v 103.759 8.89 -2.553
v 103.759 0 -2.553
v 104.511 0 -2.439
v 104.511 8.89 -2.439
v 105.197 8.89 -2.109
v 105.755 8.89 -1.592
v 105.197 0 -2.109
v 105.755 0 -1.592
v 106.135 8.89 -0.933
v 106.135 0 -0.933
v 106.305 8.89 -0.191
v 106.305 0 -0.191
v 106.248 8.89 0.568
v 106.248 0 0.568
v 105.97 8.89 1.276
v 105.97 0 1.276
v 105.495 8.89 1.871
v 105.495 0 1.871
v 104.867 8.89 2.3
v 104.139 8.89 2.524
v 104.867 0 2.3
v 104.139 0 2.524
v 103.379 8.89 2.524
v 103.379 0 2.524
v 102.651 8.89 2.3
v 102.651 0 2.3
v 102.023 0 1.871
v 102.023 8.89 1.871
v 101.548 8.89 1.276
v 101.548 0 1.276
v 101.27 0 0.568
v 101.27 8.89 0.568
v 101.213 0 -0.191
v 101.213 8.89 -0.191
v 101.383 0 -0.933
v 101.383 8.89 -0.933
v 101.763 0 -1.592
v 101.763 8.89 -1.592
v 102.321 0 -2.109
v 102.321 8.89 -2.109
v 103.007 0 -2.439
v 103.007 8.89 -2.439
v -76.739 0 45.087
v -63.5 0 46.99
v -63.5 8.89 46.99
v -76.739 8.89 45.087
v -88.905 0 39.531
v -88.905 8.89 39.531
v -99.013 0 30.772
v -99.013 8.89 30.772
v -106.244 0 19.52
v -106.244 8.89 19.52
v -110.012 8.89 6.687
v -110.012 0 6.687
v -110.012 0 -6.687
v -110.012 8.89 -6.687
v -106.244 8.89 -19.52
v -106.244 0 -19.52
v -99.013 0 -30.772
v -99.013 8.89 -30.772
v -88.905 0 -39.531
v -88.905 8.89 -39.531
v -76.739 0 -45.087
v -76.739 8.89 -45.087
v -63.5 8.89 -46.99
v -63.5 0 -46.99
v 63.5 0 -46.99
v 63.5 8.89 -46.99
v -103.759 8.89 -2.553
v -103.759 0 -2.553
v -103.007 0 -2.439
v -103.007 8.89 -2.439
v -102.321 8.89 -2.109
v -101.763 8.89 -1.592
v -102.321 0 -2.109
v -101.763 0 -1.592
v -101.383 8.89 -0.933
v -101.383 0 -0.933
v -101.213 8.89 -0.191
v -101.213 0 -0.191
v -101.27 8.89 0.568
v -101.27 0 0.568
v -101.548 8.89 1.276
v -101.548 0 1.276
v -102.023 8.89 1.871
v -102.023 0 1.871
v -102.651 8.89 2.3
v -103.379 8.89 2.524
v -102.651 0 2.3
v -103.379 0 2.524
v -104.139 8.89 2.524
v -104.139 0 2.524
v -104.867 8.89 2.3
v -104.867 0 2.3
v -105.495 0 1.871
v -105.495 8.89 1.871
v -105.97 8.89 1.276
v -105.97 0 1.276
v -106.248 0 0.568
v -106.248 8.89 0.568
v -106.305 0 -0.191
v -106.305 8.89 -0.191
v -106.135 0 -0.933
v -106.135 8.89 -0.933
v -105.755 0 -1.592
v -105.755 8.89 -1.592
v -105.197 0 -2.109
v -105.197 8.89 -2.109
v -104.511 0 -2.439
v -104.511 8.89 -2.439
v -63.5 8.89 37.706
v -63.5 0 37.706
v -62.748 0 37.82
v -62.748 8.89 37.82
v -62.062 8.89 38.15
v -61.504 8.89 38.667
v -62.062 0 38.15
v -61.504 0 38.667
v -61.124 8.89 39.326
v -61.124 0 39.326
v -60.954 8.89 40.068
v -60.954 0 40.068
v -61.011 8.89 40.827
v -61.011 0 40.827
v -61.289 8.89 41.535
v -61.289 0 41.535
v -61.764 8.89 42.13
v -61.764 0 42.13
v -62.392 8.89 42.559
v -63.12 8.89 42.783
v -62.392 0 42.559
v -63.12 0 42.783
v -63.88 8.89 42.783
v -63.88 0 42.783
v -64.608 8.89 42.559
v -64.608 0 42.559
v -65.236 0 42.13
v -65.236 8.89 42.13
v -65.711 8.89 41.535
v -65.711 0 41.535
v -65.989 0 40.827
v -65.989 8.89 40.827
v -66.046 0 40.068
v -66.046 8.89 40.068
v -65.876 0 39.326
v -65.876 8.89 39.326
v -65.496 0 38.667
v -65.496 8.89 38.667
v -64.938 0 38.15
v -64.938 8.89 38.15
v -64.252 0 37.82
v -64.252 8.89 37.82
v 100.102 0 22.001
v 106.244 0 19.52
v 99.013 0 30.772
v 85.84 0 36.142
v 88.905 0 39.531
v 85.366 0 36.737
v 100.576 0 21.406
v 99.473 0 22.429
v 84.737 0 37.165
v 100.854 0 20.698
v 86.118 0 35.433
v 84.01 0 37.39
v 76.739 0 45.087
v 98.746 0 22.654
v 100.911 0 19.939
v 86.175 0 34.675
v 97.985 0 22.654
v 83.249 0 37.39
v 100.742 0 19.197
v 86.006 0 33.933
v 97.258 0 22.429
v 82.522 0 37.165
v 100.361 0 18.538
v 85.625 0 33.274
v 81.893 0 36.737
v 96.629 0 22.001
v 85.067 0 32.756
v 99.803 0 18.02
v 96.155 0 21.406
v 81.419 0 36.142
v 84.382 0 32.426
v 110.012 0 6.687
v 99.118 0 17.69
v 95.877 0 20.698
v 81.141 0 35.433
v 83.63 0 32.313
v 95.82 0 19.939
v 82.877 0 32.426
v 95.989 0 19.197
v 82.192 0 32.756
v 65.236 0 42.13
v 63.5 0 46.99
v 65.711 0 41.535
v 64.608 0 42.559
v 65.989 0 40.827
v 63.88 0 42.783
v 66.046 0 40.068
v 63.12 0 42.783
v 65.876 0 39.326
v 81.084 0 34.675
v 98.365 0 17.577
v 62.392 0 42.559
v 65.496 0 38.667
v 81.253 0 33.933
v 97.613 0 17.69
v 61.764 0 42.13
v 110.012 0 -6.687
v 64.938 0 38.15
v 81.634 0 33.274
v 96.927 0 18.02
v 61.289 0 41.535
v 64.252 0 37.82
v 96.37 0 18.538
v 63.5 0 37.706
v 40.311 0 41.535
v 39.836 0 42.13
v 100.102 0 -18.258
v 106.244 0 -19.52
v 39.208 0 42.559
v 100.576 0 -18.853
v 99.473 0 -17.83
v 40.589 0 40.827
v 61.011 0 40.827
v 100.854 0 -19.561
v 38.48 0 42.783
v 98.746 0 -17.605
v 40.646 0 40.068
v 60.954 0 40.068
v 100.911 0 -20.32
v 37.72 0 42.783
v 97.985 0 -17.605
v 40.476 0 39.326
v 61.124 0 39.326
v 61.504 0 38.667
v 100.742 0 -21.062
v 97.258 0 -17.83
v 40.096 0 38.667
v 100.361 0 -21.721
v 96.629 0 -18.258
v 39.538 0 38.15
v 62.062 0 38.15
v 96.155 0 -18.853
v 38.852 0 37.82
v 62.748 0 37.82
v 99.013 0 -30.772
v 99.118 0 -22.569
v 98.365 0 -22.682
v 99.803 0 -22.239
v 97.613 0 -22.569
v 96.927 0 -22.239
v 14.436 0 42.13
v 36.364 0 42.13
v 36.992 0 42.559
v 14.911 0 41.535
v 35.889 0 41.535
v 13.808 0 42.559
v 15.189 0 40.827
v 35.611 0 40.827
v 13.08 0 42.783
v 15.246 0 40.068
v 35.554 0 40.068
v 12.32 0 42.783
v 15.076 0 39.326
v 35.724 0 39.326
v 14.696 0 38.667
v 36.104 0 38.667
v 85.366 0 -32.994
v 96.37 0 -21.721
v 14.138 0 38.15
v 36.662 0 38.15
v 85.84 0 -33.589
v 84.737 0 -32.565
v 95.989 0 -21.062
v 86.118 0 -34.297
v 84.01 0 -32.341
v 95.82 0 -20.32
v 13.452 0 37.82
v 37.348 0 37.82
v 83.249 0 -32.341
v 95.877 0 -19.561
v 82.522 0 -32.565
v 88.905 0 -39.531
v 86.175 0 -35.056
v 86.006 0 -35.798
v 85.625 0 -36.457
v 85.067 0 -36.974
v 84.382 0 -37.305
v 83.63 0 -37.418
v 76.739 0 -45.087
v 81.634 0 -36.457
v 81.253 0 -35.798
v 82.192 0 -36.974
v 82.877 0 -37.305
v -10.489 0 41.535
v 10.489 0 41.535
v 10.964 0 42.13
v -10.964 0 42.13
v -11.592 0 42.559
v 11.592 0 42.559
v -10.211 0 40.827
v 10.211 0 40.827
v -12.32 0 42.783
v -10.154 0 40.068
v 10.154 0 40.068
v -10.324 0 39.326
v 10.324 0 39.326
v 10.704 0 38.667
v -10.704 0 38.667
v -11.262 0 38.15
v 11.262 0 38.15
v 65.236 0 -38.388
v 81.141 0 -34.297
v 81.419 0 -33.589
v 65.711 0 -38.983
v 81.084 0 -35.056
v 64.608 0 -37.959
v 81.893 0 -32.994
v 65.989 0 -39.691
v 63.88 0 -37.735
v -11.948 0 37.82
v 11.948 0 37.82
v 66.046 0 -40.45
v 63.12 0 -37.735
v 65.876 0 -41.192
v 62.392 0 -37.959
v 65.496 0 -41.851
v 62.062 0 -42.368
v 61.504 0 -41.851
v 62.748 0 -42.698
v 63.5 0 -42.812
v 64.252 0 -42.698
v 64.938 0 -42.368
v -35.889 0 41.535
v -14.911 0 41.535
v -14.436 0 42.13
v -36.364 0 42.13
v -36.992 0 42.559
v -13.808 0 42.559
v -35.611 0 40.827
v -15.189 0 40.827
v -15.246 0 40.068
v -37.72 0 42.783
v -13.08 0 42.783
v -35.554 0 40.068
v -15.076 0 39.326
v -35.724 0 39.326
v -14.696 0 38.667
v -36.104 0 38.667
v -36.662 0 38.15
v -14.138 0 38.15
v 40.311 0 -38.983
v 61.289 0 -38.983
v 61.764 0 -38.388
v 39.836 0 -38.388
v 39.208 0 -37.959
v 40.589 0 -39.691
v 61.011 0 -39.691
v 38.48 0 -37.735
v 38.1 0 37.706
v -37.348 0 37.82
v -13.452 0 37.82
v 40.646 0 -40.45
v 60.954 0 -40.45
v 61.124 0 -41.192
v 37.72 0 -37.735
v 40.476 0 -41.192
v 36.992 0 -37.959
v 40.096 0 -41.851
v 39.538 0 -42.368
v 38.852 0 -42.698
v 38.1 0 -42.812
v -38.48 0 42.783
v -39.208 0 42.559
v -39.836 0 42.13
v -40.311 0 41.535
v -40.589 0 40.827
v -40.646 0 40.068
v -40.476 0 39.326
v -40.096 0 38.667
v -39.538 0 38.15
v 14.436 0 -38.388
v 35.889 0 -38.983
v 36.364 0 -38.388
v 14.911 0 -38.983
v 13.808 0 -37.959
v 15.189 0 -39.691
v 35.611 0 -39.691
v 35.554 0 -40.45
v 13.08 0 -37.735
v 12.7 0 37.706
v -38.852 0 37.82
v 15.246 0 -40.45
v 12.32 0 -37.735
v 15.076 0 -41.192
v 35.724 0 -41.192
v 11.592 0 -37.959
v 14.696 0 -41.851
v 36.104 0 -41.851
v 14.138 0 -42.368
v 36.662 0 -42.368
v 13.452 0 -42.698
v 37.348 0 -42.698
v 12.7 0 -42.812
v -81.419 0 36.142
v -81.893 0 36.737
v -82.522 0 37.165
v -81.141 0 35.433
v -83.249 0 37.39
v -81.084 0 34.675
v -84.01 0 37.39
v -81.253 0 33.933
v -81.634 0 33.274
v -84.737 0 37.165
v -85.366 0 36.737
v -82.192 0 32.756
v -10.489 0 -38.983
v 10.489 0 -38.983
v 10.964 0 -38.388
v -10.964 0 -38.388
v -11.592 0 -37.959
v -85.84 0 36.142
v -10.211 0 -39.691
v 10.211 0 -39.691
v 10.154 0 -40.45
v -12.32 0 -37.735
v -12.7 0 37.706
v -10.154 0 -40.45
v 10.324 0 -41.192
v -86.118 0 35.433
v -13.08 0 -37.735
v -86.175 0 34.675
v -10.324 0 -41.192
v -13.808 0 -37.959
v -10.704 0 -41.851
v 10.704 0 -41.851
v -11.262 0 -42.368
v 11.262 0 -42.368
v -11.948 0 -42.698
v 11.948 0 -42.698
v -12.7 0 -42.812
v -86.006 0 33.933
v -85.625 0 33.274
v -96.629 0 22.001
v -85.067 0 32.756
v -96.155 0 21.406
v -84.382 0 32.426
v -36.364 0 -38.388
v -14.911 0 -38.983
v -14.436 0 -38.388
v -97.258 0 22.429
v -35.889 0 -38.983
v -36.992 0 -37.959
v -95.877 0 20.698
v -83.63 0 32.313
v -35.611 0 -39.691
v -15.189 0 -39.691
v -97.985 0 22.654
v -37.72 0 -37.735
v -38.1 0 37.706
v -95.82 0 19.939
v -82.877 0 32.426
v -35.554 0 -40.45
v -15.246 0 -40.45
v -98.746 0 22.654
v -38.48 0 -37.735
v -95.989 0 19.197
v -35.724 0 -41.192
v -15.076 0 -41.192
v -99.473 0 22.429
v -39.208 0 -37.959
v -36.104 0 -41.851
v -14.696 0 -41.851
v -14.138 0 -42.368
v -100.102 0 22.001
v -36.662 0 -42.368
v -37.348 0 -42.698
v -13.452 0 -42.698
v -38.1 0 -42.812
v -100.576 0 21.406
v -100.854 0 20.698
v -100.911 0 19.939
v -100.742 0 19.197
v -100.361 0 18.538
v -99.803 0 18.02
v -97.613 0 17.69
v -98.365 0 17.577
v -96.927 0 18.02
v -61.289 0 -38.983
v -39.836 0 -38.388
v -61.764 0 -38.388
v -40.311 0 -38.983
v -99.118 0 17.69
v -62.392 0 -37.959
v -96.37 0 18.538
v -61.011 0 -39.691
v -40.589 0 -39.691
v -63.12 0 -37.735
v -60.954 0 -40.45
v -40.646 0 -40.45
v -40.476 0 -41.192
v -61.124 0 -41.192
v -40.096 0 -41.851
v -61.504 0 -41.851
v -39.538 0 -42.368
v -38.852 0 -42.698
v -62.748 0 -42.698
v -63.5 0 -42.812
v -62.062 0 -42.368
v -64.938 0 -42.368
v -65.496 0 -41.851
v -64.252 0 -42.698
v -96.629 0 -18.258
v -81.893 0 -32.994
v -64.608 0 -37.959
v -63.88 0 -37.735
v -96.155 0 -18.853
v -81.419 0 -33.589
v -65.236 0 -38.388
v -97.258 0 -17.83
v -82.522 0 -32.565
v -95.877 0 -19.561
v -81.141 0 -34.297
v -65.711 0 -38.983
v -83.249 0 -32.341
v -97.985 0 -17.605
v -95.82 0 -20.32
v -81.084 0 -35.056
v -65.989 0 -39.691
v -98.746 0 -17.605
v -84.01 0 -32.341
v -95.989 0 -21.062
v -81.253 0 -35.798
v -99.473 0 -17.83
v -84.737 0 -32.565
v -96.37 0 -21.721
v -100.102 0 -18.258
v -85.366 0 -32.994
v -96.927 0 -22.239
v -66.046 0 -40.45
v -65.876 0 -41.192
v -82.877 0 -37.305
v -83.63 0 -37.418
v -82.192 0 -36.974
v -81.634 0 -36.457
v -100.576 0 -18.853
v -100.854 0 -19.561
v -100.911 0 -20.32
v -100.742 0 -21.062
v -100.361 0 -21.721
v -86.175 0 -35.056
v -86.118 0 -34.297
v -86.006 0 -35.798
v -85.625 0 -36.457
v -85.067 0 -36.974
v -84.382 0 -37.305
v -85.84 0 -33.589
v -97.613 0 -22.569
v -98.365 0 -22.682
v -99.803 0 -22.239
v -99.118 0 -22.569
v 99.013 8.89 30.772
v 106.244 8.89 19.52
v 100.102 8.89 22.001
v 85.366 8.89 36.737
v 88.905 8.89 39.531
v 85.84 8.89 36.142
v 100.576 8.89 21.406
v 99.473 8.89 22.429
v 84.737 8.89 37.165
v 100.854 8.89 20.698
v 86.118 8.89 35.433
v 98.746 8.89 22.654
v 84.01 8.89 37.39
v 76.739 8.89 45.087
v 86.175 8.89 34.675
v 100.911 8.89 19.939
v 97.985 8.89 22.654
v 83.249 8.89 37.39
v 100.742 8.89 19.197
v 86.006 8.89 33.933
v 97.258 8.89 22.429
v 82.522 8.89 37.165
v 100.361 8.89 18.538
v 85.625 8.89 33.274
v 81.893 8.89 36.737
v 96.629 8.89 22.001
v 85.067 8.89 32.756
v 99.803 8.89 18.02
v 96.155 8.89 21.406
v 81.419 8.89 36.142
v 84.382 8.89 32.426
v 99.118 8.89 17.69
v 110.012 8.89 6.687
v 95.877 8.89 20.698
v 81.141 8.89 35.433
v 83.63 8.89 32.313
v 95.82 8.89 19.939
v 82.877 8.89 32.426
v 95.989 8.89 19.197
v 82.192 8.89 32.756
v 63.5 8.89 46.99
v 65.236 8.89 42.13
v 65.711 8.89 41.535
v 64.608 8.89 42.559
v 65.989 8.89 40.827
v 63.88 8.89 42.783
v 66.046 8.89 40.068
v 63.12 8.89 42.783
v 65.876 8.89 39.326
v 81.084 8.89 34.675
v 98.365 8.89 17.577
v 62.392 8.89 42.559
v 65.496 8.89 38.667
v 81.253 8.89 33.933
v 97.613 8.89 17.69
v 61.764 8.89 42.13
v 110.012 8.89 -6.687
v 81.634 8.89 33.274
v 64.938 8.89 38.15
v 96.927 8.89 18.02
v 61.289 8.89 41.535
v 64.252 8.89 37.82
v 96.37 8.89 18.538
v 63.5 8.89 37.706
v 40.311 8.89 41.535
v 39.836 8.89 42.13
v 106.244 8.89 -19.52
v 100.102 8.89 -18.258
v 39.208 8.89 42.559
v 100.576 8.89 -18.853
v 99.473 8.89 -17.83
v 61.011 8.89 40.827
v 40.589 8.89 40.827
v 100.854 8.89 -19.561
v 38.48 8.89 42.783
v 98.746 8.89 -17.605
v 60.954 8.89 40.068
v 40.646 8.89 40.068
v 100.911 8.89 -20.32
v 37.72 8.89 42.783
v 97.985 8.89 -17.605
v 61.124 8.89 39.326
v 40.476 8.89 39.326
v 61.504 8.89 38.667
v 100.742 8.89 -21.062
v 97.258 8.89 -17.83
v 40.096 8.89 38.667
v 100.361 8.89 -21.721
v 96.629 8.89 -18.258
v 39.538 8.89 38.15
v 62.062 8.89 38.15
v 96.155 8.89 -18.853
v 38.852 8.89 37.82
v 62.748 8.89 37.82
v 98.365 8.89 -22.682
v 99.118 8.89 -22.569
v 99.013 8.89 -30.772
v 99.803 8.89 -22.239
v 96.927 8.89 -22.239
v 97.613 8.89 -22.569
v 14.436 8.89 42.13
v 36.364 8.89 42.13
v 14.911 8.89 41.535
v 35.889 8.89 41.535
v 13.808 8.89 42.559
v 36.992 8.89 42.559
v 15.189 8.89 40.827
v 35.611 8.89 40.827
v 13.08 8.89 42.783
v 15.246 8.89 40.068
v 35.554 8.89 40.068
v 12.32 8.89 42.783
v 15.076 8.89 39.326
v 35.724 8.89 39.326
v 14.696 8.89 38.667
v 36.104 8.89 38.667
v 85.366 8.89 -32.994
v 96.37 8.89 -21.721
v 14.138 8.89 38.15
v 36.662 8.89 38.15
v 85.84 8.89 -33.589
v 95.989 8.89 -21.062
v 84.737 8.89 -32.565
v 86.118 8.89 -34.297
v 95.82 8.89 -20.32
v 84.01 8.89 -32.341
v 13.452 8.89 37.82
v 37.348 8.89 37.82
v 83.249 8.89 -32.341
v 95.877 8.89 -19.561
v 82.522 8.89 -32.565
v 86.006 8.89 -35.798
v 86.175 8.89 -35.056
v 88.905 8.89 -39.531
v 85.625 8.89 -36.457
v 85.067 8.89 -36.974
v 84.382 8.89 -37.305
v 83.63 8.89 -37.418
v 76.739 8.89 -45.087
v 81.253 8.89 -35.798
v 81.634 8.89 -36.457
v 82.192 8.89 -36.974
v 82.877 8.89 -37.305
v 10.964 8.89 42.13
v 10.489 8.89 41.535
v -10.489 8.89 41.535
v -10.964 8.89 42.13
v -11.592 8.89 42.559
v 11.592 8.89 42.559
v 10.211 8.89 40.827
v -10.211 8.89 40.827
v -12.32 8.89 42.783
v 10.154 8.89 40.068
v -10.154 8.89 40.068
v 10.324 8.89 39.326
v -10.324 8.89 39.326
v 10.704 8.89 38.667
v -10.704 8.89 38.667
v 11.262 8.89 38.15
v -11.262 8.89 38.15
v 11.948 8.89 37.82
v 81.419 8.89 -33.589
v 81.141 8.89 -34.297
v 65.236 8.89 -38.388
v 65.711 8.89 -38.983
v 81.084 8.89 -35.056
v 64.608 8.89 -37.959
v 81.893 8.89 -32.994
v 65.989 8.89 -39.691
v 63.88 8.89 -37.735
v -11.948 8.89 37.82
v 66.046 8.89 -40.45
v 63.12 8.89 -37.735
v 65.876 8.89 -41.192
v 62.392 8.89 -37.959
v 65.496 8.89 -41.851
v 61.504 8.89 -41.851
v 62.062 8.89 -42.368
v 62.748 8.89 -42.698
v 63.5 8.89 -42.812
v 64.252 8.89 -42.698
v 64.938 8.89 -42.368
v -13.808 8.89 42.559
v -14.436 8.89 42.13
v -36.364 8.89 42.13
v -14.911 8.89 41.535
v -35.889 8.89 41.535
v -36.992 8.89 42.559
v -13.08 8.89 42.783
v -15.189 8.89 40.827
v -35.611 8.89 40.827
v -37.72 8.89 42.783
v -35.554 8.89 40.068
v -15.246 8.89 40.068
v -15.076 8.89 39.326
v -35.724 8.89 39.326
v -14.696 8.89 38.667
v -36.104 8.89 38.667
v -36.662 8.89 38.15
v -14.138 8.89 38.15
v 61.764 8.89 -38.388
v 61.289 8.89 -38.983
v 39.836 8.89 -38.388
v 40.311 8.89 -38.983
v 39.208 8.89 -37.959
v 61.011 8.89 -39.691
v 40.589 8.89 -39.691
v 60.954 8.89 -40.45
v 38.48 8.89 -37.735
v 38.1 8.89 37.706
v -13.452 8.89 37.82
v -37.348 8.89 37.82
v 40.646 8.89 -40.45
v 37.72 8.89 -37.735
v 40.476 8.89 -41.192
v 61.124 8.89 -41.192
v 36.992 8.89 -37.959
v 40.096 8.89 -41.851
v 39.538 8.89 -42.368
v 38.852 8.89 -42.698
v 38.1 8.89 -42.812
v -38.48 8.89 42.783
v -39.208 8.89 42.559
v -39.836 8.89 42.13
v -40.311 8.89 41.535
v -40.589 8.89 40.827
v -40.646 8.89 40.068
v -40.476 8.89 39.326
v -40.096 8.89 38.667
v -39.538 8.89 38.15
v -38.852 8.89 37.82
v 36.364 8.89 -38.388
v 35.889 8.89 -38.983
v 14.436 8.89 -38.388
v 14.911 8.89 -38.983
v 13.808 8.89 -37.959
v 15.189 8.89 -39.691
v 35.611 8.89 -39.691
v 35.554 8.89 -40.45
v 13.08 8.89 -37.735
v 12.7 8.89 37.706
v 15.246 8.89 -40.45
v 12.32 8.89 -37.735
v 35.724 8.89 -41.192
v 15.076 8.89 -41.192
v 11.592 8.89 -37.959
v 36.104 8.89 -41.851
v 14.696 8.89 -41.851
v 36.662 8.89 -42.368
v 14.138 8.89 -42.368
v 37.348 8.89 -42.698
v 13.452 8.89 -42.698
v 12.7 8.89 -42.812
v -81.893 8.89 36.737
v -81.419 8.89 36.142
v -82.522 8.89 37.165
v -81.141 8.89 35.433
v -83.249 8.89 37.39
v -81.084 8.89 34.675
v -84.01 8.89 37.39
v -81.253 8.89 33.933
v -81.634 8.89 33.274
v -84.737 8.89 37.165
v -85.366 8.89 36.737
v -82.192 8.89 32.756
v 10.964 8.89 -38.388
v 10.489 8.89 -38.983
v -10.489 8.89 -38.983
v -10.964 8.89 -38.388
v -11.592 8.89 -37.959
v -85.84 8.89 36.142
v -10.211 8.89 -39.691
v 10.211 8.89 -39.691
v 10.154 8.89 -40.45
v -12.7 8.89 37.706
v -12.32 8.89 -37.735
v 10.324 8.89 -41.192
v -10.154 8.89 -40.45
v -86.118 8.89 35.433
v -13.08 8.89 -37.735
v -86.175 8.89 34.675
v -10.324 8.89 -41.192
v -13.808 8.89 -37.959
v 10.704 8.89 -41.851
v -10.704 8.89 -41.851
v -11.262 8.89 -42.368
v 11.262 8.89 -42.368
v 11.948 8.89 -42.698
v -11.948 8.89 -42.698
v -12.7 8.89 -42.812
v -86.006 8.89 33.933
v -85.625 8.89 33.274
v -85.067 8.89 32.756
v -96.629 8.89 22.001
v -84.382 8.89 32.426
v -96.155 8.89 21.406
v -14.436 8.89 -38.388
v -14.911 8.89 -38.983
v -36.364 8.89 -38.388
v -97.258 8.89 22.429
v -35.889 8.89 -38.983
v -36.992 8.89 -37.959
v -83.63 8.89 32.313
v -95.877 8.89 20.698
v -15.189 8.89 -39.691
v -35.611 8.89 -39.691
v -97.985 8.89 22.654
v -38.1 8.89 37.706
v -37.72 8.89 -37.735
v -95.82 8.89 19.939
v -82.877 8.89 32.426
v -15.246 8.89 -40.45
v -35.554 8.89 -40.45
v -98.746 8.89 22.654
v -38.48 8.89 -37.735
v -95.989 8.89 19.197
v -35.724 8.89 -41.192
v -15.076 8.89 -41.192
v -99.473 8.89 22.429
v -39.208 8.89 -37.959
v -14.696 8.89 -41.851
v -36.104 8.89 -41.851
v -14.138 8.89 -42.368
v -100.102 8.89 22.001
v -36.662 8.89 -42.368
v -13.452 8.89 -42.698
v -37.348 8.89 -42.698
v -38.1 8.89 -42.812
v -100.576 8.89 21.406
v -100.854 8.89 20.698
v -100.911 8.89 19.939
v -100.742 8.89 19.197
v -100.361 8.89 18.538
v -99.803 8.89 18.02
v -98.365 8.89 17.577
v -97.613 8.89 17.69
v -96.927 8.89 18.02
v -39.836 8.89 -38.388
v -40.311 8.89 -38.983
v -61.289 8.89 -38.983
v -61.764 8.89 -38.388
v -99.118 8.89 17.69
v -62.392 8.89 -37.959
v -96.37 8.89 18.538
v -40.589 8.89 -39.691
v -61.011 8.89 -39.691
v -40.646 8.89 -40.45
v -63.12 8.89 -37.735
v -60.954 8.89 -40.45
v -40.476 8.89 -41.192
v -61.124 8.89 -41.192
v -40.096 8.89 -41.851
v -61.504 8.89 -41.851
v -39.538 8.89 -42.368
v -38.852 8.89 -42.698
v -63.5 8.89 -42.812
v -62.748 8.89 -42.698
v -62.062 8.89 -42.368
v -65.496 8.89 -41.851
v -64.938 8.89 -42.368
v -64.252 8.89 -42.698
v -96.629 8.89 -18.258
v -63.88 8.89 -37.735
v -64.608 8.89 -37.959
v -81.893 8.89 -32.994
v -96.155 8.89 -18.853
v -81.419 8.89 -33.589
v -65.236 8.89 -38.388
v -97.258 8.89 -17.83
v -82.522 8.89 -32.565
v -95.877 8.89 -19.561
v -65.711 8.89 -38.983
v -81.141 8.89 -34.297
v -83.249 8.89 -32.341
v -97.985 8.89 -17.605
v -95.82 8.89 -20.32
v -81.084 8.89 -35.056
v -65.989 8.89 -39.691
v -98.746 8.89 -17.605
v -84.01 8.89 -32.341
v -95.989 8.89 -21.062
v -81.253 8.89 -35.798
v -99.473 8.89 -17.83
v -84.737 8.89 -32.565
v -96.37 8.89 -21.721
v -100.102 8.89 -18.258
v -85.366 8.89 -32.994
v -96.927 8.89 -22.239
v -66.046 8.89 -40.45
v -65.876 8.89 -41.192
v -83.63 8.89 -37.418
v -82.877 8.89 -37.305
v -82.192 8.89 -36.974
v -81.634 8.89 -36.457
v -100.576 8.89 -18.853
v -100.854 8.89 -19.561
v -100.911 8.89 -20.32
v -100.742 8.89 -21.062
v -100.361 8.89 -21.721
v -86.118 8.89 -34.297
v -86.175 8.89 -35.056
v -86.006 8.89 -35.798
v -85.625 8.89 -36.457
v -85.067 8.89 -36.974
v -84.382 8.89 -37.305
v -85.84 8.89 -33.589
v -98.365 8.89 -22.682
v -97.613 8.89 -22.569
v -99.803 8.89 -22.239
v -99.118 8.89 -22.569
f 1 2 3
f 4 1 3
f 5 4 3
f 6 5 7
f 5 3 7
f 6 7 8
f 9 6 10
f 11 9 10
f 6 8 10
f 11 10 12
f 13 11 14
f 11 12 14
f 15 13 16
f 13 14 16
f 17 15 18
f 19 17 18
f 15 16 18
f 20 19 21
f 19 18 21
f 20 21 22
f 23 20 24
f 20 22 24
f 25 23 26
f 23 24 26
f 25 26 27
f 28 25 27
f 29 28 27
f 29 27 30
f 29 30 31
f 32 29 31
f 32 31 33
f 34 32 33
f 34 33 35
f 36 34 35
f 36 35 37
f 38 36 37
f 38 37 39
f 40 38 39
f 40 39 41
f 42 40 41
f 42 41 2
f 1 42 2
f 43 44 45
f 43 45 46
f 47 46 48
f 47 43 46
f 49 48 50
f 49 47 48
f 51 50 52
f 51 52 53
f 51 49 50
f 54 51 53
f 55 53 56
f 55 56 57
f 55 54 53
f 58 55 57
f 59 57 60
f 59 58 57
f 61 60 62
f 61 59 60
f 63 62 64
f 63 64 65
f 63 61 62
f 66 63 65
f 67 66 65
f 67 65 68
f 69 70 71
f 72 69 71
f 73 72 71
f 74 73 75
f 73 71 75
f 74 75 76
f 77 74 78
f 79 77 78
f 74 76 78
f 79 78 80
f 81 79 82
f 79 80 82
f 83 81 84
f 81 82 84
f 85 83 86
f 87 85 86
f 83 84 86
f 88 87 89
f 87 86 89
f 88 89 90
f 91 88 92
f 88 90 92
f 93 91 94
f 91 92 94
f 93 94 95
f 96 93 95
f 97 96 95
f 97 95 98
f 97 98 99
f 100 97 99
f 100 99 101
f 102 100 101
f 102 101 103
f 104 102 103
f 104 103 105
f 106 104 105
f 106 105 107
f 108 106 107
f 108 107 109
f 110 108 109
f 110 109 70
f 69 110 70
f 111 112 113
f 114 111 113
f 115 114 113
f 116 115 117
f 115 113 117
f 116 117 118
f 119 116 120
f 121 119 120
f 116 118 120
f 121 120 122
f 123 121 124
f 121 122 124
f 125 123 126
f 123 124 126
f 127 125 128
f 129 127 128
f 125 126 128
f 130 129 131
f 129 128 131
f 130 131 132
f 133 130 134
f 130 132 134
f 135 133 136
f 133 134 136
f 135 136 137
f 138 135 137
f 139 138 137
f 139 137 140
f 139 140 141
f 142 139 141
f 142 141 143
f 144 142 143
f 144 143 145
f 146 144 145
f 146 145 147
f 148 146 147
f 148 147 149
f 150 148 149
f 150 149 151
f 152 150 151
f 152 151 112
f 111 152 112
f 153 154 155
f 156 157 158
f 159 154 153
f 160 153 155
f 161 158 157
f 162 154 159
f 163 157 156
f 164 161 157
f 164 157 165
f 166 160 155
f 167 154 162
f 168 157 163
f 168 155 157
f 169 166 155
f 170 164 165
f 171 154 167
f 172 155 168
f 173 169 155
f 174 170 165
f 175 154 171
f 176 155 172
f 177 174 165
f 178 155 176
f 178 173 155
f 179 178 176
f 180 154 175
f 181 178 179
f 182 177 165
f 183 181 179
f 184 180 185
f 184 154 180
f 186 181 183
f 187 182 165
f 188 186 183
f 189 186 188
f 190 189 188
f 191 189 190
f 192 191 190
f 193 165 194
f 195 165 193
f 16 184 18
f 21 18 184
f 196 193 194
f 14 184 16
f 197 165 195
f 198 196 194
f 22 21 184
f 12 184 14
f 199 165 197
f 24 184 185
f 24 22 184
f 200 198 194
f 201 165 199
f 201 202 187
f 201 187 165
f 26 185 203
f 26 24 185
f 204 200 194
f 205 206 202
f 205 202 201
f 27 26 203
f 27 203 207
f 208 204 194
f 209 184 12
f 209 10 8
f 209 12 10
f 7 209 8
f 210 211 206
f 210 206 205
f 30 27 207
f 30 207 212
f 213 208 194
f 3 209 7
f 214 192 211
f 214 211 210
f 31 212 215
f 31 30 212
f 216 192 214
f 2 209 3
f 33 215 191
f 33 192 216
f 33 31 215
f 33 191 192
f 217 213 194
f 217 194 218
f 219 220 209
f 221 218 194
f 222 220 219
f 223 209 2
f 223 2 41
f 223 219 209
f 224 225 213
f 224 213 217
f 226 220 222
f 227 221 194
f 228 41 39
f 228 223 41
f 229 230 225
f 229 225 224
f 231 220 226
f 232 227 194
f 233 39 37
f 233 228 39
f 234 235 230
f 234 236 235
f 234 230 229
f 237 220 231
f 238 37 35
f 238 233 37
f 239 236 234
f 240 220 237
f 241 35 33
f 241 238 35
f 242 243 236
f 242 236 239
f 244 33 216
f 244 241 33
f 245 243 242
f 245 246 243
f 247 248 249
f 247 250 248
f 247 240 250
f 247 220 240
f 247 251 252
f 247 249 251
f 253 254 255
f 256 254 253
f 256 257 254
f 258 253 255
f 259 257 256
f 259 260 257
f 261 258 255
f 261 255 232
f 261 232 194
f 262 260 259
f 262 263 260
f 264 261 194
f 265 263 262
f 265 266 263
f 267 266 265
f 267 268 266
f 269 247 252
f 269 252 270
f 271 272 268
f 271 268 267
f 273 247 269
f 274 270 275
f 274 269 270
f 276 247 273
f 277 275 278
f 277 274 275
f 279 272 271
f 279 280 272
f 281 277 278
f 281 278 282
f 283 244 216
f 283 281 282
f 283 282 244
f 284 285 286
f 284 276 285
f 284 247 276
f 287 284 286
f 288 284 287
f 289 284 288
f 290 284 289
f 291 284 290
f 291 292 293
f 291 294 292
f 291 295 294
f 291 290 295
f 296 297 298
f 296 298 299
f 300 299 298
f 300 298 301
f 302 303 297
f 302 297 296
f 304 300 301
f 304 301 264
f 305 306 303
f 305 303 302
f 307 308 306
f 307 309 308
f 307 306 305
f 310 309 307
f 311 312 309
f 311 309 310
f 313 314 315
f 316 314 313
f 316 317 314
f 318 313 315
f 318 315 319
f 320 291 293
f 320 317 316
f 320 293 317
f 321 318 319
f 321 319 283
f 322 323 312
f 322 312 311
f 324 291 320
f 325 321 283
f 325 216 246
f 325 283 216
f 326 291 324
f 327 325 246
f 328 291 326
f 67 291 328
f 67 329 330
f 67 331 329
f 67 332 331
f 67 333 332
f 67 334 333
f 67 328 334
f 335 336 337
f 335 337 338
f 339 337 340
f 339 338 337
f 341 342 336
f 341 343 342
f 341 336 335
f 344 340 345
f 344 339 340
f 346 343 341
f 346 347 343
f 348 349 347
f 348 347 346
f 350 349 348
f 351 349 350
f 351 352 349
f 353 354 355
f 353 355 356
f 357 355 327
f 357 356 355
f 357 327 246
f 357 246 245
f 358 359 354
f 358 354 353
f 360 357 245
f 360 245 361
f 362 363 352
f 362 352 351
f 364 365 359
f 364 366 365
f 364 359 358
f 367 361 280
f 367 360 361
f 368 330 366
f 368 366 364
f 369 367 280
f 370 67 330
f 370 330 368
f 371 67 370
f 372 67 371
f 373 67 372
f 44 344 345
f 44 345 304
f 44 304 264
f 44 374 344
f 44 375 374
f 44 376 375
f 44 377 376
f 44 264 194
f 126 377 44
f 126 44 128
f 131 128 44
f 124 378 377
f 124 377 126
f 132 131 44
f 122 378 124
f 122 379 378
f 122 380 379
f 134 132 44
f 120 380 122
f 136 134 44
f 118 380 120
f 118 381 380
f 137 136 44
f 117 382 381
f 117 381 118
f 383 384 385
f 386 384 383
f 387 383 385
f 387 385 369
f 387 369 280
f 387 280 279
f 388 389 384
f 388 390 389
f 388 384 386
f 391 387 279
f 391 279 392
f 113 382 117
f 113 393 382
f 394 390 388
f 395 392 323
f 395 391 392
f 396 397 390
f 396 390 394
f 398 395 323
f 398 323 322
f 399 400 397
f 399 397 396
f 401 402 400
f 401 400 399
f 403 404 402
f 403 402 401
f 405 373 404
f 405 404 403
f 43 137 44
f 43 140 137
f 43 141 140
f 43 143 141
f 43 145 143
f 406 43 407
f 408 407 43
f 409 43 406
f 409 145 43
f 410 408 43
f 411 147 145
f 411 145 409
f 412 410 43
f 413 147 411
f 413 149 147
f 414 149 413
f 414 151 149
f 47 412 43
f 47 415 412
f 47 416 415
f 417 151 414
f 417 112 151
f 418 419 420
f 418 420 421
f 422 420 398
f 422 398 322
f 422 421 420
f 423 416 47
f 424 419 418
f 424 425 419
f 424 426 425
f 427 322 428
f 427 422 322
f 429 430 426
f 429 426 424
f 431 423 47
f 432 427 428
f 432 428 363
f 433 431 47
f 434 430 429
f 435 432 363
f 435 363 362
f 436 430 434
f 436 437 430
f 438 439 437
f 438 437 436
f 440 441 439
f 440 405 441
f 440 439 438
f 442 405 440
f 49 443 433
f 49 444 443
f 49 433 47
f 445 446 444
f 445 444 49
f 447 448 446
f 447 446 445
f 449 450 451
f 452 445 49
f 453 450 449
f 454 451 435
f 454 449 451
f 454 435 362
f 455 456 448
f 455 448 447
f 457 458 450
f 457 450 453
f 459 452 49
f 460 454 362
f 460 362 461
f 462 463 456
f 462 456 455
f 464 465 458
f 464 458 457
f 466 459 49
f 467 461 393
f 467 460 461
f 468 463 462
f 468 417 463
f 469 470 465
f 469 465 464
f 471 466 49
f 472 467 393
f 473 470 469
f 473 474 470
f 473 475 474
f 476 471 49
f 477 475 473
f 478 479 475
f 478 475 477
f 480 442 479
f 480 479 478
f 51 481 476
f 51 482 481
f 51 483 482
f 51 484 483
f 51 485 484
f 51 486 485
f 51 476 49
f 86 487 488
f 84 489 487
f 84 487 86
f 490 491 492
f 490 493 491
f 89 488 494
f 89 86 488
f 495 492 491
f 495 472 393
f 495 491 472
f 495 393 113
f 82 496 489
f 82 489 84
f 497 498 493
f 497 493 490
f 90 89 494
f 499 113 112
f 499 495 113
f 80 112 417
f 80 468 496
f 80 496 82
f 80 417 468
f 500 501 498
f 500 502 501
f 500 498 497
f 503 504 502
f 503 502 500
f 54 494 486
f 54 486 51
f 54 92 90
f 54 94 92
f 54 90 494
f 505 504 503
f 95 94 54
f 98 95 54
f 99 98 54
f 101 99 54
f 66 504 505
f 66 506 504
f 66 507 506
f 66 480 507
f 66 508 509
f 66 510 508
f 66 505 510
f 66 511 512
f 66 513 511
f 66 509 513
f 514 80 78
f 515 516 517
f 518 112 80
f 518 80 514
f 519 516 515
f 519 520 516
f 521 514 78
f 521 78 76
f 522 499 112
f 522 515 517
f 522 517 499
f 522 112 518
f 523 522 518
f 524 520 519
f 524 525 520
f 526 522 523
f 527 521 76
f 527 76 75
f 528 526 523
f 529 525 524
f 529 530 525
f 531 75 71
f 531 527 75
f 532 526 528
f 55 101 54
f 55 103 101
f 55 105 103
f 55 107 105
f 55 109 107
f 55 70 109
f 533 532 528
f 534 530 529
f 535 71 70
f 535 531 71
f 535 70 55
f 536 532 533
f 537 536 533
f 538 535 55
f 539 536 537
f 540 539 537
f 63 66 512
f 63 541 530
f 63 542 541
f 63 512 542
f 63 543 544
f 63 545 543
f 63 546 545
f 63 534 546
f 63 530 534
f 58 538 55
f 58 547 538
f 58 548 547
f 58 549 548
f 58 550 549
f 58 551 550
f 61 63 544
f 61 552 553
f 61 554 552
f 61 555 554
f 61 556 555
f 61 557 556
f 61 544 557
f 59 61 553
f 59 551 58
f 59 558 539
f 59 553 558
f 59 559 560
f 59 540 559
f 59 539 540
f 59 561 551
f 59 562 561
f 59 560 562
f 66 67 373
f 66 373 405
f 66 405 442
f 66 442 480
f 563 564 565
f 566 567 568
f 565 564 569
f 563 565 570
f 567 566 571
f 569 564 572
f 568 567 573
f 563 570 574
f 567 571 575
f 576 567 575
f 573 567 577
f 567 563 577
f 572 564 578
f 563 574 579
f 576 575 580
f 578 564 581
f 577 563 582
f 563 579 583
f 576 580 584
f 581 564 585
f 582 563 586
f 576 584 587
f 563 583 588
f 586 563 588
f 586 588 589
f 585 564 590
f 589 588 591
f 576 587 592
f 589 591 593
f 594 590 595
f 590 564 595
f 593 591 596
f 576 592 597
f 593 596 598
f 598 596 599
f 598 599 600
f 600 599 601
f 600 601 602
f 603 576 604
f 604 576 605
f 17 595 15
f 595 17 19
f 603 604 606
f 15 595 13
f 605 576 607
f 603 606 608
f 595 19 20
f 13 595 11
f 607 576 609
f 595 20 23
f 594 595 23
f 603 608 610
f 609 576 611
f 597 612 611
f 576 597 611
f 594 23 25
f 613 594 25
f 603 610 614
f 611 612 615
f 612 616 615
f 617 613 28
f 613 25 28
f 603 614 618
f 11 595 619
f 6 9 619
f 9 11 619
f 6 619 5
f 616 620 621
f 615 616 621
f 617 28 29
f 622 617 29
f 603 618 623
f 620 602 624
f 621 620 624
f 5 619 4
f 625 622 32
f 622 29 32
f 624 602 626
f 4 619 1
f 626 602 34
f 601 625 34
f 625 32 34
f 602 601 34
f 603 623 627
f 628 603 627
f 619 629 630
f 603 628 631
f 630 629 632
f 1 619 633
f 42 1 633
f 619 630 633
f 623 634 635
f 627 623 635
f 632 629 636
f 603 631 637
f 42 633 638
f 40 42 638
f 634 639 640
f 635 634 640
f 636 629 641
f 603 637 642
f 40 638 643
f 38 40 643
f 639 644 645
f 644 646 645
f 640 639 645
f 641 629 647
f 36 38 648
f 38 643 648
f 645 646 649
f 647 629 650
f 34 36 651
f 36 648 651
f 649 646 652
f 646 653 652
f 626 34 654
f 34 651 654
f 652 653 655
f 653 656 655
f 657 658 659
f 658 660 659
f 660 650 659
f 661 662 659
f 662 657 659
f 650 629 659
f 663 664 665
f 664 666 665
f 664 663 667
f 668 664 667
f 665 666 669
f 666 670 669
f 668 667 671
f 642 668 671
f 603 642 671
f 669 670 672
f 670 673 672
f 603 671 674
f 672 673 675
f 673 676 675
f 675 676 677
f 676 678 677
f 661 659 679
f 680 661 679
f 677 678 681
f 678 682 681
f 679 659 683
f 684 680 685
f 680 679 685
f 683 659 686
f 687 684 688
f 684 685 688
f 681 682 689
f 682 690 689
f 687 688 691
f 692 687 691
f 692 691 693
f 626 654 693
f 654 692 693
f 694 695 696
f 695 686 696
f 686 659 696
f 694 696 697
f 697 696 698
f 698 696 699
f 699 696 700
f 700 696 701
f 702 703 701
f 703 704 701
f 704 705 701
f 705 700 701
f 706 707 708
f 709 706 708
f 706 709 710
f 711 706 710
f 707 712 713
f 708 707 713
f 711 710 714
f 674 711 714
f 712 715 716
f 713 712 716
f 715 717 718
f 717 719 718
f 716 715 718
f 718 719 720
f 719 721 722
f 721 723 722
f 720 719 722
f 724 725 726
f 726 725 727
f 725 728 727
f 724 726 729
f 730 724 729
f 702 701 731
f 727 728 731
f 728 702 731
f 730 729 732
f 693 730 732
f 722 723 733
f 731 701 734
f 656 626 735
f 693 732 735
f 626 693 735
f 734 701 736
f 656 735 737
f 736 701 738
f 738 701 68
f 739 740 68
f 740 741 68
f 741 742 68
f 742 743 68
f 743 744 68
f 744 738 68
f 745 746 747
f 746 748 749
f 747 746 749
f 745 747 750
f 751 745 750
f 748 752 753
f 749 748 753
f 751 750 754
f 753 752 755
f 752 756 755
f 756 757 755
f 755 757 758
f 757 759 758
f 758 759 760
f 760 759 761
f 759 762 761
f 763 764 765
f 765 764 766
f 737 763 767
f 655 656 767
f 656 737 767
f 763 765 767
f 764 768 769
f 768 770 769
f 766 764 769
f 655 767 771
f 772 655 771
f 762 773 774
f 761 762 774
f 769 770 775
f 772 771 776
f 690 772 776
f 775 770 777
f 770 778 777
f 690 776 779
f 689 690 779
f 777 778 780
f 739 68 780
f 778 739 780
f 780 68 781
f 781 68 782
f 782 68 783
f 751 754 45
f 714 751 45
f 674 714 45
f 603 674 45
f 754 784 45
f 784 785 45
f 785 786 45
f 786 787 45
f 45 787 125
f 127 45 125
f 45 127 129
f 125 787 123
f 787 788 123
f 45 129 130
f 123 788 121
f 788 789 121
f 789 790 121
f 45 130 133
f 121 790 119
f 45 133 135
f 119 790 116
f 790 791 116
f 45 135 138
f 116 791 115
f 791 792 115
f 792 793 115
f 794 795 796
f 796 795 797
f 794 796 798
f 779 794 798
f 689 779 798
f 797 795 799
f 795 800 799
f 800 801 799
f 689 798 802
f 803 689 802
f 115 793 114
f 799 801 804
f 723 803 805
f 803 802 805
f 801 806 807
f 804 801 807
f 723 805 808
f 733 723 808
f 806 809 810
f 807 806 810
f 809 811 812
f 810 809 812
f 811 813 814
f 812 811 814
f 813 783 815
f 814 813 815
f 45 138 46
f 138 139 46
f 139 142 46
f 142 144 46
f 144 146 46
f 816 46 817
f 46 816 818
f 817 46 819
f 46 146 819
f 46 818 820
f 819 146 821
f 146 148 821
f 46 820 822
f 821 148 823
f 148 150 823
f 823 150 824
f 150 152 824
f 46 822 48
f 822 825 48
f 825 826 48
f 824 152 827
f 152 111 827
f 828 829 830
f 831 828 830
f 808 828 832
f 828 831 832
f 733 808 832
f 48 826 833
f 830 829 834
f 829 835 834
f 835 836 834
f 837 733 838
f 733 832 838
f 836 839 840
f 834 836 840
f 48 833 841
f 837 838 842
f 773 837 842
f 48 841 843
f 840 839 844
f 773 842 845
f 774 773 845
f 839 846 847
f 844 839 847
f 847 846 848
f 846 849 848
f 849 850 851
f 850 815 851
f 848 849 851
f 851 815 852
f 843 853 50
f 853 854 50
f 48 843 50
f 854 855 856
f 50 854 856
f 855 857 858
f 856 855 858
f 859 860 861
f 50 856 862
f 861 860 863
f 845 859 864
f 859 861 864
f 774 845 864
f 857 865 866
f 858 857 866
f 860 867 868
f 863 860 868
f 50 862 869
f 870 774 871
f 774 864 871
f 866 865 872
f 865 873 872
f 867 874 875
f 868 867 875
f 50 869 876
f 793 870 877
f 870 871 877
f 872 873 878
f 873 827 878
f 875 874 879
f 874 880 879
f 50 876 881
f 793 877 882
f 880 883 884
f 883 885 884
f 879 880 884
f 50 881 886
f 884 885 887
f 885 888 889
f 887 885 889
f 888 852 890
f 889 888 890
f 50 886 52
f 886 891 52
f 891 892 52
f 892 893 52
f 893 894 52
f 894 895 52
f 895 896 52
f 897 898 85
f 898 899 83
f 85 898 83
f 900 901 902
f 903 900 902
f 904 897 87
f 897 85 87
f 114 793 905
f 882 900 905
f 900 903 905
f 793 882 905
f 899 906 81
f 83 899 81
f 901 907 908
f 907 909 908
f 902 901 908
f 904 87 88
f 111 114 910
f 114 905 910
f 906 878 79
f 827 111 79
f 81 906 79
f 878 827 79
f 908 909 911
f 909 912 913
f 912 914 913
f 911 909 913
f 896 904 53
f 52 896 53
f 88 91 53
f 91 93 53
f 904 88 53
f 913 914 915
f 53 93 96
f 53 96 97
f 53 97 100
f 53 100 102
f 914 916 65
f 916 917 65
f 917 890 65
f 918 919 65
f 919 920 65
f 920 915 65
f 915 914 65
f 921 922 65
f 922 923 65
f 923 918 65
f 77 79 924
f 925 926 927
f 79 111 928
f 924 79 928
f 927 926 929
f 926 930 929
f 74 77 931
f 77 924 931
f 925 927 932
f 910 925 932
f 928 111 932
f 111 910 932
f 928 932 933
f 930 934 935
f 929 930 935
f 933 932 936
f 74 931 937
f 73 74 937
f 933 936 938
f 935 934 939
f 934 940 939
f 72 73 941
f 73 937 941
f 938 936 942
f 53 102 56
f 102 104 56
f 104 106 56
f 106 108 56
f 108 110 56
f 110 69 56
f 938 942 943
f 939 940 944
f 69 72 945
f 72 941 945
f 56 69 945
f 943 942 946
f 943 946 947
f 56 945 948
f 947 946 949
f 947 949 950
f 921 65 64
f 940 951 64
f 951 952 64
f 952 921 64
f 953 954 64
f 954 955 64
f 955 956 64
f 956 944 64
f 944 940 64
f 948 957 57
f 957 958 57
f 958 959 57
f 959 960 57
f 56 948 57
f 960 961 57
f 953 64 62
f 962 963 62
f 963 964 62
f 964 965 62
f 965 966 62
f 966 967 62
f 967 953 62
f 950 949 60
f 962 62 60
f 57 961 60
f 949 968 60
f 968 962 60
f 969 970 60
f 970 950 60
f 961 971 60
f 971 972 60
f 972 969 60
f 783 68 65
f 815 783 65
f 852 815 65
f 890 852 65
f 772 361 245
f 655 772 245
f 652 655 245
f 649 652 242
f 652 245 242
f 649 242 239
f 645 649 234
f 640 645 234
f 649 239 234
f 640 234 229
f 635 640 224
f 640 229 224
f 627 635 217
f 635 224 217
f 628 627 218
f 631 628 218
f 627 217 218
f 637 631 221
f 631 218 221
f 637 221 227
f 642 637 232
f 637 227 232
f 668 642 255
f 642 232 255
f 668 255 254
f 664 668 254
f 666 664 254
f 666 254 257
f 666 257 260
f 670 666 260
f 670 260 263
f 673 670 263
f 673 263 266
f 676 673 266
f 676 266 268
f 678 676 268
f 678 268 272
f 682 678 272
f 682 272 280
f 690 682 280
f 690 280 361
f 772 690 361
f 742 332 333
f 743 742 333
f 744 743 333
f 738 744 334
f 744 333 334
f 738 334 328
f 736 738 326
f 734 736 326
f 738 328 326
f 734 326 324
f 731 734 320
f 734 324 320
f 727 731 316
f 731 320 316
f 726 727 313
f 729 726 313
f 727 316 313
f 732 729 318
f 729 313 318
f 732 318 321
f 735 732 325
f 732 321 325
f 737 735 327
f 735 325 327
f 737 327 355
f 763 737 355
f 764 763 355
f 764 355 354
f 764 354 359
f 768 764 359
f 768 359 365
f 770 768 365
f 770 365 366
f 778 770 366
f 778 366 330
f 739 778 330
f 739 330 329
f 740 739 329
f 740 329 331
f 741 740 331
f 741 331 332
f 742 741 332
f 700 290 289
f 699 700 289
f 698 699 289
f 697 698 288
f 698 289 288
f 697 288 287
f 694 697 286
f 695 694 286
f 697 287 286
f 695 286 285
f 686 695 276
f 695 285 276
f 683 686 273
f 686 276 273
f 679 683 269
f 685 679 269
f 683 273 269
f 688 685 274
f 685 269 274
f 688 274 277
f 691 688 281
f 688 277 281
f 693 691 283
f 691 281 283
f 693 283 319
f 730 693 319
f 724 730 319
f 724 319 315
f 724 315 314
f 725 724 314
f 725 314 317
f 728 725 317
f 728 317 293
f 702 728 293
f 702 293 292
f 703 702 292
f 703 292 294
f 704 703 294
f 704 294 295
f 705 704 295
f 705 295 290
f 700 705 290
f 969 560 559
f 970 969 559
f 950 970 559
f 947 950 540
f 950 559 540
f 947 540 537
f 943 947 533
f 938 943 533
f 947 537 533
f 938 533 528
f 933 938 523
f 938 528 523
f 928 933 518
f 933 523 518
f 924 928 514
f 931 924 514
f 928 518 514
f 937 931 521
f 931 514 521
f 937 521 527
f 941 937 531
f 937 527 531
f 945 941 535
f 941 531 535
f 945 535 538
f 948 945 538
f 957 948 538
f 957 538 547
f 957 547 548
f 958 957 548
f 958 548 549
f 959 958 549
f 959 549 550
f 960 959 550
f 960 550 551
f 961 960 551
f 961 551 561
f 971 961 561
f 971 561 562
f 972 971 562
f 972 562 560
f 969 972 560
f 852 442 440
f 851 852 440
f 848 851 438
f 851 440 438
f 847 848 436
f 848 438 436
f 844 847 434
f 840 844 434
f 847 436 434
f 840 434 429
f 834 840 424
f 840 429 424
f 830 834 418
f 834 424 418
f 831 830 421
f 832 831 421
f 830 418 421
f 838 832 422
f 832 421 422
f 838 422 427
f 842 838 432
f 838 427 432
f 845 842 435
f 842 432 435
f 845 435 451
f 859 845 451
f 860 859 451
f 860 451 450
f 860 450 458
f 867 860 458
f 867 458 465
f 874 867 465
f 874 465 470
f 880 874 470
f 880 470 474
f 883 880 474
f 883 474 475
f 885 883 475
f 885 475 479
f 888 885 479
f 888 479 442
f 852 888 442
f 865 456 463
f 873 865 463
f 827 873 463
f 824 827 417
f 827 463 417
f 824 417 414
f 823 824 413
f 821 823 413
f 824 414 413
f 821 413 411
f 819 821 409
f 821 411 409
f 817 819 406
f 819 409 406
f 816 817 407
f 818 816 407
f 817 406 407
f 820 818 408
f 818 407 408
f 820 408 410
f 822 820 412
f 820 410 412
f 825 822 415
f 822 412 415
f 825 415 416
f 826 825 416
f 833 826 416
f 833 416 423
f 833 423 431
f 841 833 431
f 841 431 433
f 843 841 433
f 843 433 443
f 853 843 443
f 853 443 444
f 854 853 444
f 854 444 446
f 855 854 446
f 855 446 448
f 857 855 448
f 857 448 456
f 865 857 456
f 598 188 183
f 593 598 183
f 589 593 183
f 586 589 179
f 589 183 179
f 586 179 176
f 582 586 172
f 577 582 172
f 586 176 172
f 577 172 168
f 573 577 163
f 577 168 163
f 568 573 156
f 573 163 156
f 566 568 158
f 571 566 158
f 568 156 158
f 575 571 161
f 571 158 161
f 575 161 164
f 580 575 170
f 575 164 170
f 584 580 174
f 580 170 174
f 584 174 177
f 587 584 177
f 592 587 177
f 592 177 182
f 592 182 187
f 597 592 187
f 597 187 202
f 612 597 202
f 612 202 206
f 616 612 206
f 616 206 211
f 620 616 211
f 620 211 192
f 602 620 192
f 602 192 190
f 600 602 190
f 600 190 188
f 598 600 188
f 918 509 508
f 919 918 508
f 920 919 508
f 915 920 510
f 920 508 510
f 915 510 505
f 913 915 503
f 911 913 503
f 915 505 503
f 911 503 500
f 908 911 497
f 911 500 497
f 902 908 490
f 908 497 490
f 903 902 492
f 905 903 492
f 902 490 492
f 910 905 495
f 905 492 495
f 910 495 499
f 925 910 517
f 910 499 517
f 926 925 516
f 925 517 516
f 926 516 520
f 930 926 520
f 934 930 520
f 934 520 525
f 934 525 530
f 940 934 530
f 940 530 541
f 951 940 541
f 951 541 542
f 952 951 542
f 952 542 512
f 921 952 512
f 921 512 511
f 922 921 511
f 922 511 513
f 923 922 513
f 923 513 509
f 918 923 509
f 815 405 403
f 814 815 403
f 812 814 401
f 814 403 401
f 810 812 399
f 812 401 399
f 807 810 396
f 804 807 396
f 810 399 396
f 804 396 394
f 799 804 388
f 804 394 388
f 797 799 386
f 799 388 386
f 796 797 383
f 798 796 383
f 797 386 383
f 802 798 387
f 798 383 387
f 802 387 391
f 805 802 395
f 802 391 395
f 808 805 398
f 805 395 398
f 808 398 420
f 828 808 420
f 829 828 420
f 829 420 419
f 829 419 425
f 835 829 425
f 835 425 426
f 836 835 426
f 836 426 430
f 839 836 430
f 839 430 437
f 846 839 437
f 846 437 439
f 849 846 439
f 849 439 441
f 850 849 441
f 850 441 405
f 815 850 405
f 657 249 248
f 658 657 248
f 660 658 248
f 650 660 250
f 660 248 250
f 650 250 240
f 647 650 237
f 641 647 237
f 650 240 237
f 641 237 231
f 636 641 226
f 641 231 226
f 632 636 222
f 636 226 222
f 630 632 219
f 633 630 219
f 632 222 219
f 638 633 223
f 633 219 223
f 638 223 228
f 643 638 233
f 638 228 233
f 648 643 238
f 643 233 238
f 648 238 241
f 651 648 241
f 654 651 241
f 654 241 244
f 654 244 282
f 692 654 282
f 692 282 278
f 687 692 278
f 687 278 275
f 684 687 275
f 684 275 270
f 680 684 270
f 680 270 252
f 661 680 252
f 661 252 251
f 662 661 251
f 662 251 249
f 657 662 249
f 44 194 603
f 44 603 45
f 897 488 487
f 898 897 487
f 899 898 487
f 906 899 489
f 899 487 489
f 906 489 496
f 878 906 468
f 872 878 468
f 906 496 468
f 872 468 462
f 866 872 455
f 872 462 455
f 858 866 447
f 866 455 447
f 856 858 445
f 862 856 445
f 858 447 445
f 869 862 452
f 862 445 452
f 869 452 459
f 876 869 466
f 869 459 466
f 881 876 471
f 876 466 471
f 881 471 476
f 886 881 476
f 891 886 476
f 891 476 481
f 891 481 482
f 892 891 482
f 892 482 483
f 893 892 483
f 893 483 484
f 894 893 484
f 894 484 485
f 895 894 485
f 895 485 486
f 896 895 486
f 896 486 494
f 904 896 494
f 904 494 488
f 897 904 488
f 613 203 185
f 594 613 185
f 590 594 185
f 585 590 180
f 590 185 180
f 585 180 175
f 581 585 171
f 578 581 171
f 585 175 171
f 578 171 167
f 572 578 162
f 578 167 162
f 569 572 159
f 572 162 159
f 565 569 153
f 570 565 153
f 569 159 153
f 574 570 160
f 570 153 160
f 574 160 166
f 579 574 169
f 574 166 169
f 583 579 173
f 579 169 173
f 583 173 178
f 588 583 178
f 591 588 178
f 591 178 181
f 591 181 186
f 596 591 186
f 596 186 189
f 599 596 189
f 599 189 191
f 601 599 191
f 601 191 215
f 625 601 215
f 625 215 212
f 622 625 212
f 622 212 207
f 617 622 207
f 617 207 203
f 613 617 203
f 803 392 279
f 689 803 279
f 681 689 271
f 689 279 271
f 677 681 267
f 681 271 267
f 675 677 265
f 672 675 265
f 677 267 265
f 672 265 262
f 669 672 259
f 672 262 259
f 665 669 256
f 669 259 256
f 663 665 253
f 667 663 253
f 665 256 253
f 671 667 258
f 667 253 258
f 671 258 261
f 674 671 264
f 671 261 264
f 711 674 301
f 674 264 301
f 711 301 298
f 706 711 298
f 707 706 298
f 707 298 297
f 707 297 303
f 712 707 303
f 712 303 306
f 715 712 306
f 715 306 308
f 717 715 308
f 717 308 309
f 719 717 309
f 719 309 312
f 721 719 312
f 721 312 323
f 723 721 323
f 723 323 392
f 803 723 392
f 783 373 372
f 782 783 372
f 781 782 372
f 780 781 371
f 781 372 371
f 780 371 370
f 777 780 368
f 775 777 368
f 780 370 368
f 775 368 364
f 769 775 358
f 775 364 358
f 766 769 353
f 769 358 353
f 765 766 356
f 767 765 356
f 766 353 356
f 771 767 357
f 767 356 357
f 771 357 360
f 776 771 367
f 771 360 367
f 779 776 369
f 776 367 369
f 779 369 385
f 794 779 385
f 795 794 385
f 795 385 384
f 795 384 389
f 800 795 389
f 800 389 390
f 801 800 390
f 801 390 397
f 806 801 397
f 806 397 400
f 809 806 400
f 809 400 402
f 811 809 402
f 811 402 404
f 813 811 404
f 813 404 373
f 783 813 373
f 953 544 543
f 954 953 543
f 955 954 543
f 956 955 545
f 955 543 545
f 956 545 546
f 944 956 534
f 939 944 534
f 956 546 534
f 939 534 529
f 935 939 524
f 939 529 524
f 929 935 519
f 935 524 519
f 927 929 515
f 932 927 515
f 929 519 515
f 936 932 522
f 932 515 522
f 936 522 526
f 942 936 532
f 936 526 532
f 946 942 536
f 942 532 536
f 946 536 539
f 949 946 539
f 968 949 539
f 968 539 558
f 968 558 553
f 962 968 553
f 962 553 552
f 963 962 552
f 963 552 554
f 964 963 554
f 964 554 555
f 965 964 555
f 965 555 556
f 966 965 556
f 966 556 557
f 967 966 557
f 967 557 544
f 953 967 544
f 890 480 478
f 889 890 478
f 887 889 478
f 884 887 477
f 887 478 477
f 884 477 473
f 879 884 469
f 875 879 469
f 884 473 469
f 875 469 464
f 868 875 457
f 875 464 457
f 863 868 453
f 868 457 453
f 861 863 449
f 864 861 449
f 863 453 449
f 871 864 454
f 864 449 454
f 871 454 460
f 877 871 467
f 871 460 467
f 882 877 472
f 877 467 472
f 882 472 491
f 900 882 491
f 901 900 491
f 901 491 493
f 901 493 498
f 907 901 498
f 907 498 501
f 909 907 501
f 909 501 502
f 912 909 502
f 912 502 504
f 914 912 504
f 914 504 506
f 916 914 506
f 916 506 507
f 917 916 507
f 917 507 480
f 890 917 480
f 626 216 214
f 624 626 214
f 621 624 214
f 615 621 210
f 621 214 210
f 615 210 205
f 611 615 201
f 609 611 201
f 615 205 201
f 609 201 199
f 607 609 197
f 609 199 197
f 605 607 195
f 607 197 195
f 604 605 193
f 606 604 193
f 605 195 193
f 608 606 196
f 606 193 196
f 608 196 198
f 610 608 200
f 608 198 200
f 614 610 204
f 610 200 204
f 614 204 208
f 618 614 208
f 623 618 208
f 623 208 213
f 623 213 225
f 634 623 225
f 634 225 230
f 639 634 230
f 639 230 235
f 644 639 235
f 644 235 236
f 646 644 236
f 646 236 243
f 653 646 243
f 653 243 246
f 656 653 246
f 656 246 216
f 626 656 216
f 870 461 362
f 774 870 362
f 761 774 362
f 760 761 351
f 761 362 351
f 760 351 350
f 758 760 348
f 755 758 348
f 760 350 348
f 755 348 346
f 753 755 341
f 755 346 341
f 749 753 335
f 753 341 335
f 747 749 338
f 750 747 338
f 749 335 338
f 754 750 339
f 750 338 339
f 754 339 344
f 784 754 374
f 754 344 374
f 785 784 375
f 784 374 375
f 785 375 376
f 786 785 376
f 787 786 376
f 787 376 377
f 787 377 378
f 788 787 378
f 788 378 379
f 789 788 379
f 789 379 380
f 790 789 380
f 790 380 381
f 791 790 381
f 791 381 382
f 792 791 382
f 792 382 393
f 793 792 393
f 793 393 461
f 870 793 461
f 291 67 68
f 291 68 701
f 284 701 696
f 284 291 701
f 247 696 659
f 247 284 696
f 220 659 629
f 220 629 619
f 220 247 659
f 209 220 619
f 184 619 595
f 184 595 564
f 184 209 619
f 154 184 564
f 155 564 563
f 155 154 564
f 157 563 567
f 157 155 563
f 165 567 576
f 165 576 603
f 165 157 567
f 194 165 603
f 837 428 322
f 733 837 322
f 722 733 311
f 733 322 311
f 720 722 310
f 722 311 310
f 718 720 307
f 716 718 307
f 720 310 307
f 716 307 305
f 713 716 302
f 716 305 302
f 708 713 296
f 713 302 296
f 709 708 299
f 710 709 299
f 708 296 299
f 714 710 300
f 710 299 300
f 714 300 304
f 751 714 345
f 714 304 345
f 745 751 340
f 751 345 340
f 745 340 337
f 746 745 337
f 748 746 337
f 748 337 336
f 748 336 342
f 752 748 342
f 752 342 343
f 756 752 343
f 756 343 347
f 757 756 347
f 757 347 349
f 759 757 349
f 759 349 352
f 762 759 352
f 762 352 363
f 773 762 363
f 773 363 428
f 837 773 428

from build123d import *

# Parameters (mm, degrees)
BOSS_EXTRUDE1_DEPTH = 8.89
SKETCH4_R           = 2.5527
CUT_EXTRUDE1_DEPTH  = 121.395732067


with BuildPart() as part:
    # Sketch1 → Boss-Extrude1 (new body)
    with BuildSketch(Plane(origin=(0, 0, 0), x_dir=(1, 0, 0), z_dir=(0, 1, 0))):
        with BuildLine():
            Line((-63.5, 46.99), (63.5, 46.99))
            ThreePointArc((63.5, 46.99), (110.49, 0), (63.5, -46.99))
            Line((63.5, -46.99), (-63.5, -46.99))
            ThreePointArc((-63.5, -46.99), (-110.49, 0), (-63.5, 46.99))
        make_face()
    extrude(amount=BOSS_EXTRUDE1_DEPTH)

    # Sketch4 → Cut-Extrude1 (cut, through all)
    with BuildSketch(Plane.XZ):
        with Locations(Location((83.6295, -34.865316731, 0), (0, 0, 270))):
            Circle(SKETCH4_R)
        with Locations(Location((63.5, -40.259, 0), (0, 0, 270))):
            Circle(SKETCH4_R)
        with Locations(Location((38.1, -40.259, 0), (0, 0, 270))):
            Circle(SKETCH4_R)
        with Locations(Location((12.7, -40.259, 0), (0, 0, 270))):
            Circle(SKETCH4_R)
        with Locations(Location((-12.7, -40.259, 0), (0, 0, 270))):
            Circle(SKETCH4_R)
        with Locations(Location((-38.1, -40.259, 0), (0, 0, 270))):
            Circle(SKETCH4_R)
        with Locations(Location((-63.5, -40.259, 0), (0, 0, 270))):
            Circle(SKETCH4_R)
        with Locations(Location((-83.6295, -34.865316731, 0), (0, 0, 270))):
            Circle(SKETCH4_R)
        with Locations(Location((-98.365316731, -20.1295, 0), (0, 0, 270))):
            Circle(SKETCH4_R)
        with Locations(Location((-103.759, 0, 0), (0, 0, 270))):
            Circle(SKETCH4_R)
        with Locations(Location((-98.365316731, 20.1295, 0), (0, 0, 270))):
            Circle(SKETCH4_R)
        with Locations(Location((-83.6295, 34.865316731, 0), (0, 0, 270))):
            Circle(SKETCH4_R)
        with Locations(Location((-63.5, 40.259, 0), (0, 0, 270))):
            Circle(SKETCH4_R)
        with Locations(Location((-38.1, 40.259, 0), (0, 0, 270))):
            Circle(SKETCH4_R)
        with Locations(Location((-12.7, 40.259, 0), (0, 0, 270))):
            Circle(SKETCH4_R)
        with Locations(Location((12.7, 40.259, 0), (0, 0, 270))):
            Circle(SKETCH4_R)
        with Locations(Location((38.1, 40.259, 0), (0, 0, 270))):
            Circle(SKETCH4_R)
        with Locations(Location((63.5, 40.259, 0), (0, 0, 270))):
            Circle(SKETCH4_R)
        with Locations(Location((83.6295, 34.865316731, 0), (0, 0, 270))):
            Circle(SKETCH4_R)
        with Locations(Location((98.365316731, 20.1295, 0), (0, 0, 270))):
            Circle(SKETCH4_R)
        with Locations(Location((103.759, 0, 0), (0, 0, 270))):
            Circle(SKETCH4_R)
        with Locations(Location((98.365316731, -20.1295, 0), (0, 0, 270))):
            Circle(SKETCH4_R)
    extrude(amount=-CUT_EXTRUDE1_DEPTH, mode=Mode.SUBTRACT)


solid = part.part
